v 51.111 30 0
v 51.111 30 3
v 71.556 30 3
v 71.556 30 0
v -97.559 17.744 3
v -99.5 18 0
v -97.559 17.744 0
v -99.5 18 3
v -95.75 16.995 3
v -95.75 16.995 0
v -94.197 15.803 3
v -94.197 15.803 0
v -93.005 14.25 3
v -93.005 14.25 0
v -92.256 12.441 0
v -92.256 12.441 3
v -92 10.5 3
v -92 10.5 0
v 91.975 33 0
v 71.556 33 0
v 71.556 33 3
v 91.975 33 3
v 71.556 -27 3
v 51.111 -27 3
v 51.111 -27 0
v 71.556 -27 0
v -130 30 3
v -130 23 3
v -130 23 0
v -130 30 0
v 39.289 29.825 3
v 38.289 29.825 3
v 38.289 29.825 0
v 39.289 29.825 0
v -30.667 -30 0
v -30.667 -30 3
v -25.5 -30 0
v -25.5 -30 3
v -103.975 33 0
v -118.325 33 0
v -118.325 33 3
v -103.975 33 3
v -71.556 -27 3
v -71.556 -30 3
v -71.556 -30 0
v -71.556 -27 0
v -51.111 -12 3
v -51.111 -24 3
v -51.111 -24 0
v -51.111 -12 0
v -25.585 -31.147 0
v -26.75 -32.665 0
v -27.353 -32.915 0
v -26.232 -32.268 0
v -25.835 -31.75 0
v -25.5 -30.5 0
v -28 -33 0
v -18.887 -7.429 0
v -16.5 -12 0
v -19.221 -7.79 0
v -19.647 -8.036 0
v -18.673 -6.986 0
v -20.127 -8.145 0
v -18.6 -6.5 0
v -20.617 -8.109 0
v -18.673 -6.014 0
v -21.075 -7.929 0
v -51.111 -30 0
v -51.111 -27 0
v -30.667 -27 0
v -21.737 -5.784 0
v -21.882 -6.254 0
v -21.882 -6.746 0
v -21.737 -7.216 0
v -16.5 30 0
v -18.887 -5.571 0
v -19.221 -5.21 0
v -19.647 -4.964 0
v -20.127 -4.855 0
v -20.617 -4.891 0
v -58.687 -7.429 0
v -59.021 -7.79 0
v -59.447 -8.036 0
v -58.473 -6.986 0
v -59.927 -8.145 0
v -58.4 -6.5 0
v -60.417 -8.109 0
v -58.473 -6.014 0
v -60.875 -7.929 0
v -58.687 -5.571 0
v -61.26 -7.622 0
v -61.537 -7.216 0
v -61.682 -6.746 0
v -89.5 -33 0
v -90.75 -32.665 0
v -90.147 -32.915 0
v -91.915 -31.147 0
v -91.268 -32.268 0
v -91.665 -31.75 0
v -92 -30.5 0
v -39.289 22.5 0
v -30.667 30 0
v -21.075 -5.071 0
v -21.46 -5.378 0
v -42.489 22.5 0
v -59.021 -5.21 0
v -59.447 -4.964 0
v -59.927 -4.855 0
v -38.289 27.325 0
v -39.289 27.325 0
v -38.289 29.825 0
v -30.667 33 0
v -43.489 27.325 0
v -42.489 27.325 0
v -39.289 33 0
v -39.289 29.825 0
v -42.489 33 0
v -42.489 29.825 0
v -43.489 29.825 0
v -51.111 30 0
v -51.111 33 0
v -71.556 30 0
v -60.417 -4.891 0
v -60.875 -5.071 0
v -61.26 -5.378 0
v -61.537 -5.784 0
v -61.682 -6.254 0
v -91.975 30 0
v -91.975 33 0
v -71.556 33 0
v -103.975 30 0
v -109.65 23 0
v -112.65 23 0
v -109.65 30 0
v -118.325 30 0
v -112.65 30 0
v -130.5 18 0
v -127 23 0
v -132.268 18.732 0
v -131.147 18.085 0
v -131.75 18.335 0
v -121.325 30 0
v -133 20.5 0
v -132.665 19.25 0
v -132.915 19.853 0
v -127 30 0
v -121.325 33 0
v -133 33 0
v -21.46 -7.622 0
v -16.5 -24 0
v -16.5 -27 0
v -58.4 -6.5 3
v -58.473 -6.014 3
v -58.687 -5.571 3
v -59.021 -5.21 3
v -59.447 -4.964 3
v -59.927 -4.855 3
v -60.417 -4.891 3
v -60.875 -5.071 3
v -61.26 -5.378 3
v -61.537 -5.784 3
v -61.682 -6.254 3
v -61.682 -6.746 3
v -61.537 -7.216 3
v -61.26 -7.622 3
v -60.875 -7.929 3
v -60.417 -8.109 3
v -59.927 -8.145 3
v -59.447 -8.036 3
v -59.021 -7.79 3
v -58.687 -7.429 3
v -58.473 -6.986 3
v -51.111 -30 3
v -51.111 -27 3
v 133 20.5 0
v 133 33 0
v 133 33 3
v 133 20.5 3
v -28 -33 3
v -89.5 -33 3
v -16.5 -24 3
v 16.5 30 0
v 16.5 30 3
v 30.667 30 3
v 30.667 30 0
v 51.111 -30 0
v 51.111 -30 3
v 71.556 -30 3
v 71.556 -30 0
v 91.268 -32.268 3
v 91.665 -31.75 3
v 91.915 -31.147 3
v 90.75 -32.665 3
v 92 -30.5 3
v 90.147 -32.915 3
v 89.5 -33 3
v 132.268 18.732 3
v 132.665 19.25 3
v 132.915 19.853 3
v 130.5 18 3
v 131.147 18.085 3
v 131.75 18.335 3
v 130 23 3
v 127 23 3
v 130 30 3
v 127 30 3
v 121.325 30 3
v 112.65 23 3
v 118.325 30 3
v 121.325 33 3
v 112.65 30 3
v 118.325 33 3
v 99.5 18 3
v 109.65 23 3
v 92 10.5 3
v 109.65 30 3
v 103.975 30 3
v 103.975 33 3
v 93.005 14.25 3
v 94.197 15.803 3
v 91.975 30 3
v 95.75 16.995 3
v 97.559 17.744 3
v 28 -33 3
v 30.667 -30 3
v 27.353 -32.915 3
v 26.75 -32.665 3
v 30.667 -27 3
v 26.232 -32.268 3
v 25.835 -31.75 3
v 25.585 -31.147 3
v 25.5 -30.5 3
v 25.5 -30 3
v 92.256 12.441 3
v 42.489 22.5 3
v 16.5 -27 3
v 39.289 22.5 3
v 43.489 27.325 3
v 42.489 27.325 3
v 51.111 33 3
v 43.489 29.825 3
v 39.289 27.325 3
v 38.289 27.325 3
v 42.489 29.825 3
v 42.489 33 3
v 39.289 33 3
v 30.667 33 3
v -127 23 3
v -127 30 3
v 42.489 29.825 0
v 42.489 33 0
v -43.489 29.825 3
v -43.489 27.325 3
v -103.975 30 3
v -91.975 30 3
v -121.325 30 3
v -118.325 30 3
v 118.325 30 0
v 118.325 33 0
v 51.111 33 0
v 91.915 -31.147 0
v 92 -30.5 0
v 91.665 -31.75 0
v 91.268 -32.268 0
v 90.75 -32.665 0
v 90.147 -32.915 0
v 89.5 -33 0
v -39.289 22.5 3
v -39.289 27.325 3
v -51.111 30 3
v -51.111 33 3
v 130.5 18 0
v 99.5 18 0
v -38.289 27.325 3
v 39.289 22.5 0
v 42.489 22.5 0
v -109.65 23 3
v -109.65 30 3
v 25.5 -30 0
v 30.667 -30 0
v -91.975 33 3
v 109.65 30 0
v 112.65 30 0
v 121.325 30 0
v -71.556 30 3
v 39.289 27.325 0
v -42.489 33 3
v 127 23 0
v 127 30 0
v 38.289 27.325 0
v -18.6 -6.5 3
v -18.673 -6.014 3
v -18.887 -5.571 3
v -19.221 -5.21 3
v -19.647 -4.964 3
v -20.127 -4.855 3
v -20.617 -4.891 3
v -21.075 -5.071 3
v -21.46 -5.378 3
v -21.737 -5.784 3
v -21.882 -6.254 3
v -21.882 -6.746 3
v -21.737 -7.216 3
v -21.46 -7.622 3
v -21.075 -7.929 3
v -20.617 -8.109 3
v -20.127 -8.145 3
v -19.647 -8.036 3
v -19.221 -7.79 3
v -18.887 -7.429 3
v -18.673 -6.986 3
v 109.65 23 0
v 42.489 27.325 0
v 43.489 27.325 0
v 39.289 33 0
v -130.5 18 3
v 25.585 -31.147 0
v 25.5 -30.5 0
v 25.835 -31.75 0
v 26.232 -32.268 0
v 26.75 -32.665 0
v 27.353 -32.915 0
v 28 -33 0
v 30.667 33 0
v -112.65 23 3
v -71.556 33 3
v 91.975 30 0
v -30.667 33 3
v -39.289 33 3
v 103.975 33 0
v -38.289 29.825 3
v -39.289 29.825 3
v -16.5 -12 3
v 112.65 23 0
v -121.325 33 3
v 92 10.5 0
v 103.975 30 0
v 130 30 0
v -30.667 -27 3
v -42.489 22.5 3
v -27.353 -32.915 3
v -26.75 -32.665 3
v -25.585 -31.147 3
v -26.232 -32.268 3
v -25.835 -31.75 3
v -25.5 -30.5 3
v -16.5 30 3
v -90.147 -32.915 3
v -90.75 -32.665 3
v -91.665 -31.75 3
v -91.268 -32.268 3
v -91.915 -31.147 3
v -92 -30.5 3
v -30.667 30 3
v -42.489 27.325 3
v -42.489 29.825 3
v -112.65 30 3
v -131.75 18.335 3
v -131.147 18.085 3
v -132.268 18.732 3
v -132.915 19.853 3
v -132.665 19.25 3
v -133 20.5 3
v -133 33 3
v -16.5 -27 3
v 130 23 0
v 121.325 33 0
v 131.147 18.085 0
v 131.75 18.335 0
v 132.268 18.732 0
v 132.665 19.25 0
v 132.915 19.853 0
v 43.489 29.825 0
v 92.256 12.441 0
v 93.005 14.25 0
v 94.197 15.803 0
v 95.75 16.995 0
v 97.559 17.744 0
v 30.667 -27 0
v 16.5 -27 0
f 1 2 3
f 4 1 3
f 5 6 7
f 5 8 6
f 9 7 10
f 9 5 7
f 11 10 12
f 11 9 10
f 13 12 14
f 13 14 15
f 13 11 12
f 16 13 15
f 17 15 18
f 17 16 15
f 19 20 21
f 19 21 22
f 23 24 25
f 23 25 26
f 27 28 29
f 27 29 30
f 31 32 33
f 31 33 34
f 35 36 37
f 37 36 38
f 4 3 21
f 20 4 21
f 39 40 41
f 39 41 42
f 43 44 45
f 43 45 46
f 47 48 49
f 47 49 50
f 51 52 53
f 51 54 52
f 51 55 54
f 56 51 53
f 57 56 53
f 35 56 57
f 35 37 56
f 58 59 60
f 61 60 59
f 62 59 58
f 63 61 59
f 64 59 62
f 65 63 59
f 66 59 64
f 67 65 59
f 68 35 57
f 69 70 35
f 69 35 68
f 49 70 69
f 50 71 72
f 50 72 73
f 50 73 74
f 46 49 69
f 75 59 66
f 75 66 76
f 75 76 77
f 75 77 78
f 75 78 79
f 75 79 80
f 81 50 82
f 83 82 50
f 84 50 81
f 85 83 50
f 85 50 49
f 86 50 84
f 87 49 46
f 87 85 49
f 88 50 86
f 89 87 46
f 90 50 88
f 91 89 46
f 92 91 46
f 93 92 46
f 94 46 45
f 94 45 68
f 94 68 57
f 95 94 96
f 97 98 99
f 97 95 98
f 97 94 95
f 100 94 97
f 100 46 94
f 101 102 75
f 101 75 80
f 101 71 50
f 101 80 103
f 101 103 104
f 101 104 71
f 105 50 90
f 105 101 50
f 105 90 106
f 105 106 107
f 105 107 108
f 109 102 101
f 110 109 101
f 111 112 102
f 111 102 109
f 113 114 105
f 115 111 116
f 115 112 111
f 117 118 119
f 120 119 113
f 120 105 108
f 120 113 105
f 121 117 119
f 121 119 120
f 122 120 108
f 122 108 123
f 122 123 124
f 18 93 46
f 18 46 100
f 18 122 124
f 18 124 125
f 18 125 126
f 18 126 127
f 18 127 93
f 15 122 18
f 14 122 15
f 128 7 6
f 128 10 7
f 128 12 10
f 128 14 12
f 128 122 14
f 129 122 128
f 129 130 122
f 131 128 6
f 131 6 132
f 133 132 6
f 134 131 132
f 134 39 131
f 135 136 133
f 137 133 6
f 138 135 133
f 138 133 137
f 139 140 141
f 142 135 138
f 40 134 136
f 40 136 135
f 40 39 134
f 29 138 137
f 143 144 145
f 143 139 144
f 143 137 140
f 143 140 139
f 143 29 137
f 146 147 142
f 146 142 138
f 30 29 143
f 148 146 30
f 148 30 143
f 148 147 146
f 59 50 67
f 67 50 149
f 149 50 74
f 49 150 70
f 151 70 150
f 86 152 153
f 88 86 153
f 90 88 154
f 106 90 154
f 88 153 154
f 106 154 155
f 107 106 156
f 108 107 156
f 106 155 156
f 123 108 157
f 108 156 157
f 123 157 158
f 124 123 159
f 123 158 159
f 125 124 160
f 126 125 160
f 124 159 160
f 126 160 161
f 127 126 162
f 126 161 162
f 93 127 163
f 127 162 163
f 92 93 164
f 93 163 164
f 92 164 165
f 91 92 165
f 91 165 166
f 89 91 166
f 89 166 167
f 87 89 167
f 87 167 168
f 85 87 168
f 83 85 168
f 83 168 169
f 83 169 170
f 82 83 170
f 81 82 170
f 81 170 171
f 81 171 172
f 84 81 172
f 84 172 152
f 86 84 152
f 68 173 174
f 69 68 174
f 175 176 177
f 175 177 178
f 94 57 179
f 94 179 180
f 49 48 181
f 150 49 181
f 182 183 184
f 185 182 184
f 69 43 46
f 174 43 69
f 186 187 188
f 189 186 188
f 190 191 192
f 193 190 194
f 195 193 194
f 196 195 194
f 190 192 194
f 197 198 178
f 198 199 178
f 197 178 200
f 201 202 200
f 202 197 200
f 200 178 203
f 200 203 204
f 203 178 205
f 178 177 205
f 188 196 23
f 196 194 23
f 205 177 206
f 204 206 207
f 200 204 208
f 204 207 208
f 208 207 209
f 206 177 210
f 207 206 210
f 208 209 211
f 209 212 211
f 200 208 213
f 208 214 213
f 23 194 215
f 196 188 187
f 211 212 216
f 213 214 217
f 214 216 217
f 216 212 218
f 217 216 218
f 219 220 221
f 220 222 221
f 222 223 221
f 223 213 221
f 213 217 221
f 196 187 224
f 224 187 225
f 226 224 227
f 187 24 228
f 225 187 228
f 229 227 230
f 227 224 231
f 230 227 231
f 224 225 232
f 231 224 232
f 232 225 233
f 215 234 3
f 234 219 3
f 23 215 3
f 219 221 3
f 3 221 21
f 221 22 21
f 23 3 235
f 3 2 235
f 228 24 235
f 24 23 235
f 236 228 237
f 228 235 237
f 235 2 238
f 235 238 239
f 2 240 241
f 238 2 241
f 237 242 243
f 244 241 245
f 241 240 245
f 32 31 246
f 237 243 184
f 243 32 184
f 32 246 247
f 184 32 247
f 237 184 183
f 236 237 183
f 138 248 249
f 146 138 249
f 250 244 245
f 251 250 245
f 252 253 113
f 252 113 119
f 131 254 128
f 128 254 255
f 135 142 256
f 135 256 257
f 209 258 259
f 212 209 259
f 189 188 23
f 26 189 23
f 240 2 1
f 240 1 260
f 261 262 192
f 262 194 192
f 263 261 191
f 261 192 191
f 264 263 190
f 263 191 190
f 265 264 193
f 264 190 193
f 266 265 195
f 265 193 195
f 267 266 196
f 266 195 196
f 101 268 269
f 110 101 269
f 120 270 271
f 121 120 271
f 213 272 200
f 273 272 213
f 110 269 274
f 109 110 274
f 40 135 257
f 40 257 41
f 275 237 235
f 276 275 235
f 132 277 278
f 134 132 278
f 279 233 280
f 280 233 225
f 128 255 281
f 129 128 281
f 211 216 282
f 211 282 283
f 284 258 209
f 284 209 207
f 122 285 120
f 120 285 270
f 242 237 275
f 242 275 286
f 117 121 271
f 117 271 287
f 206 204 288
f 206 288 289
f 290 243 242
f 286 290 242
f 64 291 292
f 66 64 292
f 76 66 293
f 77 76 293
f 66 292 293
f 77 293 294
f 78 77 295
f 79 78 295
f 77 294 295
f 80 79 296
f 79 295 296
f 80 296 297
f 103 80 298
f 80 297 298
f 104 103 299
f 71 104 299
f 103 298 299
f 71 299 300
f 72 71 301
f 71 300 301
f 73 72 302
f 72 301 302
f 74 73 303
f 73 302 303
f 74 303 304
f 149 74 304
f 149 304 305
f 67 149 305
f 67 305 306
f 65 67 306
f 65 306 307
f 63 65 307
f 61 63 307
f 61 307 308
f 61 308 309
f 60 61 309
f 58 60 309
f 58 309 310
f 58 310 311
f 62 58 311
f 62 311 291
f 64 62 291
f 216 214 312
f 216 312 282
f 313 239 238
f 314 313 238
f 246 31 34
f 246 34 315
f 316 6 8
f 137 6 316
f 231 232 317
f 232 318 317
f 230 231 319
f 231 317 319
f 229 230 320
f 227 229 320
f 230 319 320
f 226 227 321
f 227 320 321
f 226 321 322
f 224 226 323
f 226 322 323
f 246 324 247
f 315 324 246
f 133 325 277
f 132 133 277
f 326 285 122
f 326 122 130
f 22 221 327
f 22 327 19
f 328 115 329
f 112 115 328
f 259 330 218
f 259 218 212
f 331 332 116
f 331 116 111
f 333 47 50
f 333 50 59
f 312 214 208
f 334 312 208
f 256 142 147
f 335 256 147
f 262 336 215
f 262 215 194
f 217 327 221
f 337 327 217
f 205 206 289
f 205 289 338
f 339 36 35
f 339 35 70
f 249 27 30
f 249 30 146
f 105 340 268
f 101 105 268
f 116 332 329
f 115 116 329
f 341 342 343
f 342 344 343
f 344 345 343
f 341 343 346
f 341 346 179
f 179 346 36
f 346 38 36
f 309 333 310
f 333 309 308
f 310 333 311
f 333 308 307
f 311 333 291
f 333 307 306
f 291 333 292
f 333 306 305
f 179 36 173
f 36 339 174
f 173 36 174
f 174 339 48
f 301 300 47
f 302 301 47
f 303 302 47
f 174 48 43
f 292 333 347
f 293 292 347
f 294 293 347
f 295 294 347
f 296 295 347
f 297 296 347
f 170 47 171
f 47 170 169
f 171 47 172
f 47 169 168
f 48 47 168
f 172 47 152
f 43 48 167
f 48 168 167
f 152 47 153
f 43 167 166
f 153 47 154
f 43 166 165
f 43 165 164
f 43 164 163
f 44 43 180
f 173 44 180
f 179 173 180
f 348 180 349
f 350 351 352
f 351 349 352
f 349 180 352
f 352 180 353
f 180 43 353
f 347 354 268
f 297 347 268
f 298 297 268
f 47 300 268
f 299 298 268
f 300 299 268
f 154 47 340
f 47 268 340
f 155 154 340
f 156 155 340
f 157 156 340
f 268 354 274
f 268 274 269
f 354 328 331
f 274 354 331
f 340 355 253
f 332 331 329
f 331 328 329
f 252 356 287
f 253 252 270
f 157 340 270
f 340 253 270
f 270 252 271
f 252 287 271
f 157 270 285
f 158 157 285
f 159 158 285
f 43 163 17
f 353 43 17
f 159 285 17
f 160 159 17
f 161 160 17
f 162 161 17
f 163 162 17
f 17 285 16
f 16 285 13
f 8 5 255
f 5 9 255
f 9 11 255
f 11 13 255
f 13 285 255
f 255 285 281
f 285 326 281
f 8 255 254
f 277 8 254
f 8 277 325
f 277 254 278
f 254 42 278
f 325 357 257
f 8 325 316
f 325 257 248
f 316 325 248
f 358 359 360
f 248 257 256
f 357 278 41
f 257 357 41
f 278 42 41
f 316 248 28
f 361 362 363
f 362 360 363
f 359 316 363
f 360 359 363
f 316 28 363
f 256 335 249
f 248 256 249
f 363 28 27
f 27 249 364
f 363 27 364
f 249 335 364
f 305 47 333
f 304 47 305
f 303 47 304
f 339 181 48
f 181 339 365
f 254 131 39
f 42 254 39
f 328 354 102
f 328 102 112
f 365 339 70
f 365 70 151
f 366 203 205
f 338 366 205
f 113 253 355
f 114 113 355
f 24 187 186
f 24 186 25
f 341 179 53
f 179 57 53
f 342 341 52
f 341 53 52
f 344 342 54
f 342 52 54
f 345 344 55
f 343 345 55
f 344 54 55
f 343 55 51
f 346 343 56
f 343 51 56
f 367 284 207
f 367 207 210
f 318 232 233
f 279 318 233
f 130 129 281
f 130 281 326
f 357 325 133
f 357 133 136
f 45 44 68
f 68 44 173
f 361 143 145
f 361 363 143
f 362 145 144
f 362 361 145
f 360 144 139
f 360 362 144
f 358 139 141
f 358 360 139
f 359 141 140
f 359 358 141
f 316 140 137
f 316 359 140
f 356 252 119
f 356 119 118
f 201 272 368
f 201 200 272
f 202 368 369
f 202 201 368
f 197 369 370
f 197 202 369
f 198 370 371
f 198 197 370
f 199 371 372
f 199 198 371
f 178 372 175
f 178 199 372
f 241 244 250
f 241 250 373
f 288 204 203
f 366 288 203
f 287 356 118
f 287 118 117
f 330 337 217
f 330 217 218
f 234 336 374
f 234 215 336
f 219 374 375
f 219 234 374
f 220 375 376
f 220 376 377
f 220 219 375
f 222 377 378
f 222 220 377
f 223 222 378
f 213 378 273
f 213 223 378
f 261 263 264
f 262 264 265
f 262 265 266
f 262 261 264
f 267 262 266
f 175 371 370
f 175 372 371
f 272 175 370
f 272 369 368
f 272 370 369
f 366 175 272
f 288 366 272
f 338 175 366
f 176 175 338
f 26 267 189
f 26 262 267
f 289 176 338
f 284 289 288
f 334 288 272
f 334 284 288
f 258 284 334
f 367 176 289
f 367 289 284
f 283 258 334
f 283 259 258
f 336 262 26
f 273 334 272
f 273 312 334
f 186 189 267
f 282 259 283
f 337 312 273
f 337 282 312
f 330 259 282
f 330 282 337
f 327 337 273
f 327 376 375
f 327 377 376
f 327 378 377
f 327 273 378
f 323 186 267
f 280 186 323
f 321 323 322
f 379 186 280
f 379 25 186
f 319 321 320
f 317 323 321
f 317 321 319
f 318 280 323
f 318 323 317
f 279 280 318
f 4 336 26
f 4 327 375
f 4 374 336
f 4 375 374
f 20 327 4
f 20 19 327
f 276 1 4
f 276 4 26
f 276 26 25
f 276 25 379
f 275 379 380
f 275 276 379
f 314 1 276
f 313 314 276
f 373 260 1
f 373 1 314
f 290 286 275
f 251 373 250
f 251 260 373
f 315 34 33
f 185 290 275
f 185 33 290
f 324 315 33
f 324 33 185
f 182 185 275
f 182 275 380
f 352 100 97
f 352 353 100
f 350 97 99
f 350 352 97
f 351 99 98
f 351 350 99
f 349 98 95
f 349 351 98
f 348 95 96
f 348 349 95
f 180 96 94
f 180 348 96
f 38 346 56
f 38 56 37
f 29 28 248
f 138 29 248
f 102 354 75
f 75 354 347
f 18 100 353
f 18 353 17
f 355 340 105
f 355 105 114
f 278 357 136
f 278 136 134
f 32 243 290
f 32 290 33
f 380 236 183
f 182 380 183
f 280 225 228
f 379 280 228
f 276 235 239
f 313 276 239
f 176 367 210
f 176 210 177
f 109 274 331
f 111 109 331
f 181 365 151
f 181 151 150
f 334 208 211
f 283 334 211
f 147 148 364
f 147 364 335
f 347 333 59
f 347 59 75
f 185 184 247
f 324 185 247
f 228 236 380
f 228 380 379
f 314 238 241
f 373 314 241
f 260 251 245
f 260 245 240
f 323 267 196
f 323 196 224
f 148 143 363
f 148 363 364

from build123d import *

# Parameters (mm, degrees)
BOSS_EXTRUDE1_DEPTH     = 3
SKETCH3_W               = 3
SKETCH3_H               = 7
SKETCH3_W_2             = 20.444444445
SKETCH3_H_2             = 3
CUT_EXTRUDE1_DEPTH      = 1
CUT_EXTRUDE1_DEPTH_BACK = 4
FILLET1_R               = 7.5
SKETCH4_W               = 3.2
SKETCH4_H               = 10.5
SKETCH4_W_2             = 5.2
SKETCH4_H_2             = 2.5
CUT_EXTRUDE2_DEPTH      = 1
CUT_EXTRUDE2_DEPTH_BACK = 4
SKETCH5_W               = 33
SKETCH5_H               = 66
CUT_EXTRUDE3_DEPTH      = 1
CUT_EXTRUDE3_DEPTH_BACK = 4
SKETCH6_R               = 1.65
SKETCH6_W               = 34.611111111
SKETCH6_H               = 12
CUT_EXTRUDE4_DEPTH      = 1
CUT_EXTRUDE4_DEPTH_BACK = 4
SKETCH9_W               = 9
SKETCH9_H               = 3
CUT_EXTRUDE7_DEPTH      = 1
CUT_EXTRUDE7_DEPTH_BACK = 4
FILLET2_R               = 2.5
FILLET3_R               = 2.5
SKETCH7_W               = 3
SKETCH7_H               = 3
SKETCH7_W_2             = 10
CUT_EXTRUDE5_DEPTH      = 4
CUT_EXTRUDE5_DEPTH_BACK = 1
SKETCH8_W               = 2
SKETCH8_H               = 3
CUT_EXTRUDE6_DEPTH      = 1
CUT_EXTRUDE6_DEPTH_BACK = 4


with BuildPart() as part:
    # Sketch2 → Boss-Extrude1 (new body)
    with BuildSketch(Plane.XY):
        Polygon((-133, 33), (133, 33), (133, 18), (92, 18), (92, -33), (-92, -33), (-92, 18), (-133, 18), align=None)
    extrude(amount=BOSS_EXTRUDE1_DEPTH)

    # Sketch3 → Cut-Extrude1 (cut, two sides)
    with BuildSketch(Plane.XY.offset(3)) as cut_extrude1_sk:
        with Locations((-128.5, 26.5)):
            Rectangle(SKETCH3_W, SKETCH3_H)
        with Locations((-111.15, 26.5)):
            Rectangle(SKETCH3_W, SKETCH3_H)
        with Locations((-61.333333334, 31.5)):
            Rectangle(SKETCH3_W_2, SKETCH3_H_2)
        with Locations((-20.444444445, 31.5)):
            Rectangle(SKETCH3_W_2, SKETCH3_H_2)
        with Locations((20.444444445, 31.5)):
            Rectangle(SKETCH3_W_2, SKETCH3_H_2)
        with Locations((61.333333334, 31.5)):
            Rectangle(SKETCH3_W_2, SKETCH3_H_2)
        with Locations((128.5, 26.5)):
            Rectangle(SKETCH3_W, SKETCH3_H)
        with Locations((111.15, 26.5)):
            Rectangle(SKETCH3_W, SKETCH3_H)
        with Locations((-61.333333334, -28.5)):
            Rectangle(SKETCH3_W_2, SKETCH3_H_2)
        with Locations((-20.444444445, -28.5)):
            Rectangle(SKETCH3_W_2, SKETCH3_H_2)
        with Locations((20.444444445, -28.5)):
            Rectangle(SKETCH3_W_2, SKETCH3_H_2)
        with Locations((61.333333334, -28.5)):
            Rectangle(SKETCH3_W_2, SKETCH3_H_2)
    extrude(amount=CUT_EXTRUDE1_DEPTH, mode=Mode.SUBTRACT)
    extrude(cut_extrude1_sk.sketch, amount=-CUT_EXTRUDE1_DEPTH_BACK, mode=Mode.SUBTRACT)

    # Fillet1
    fillet1_edges = [part.edges().sort_by_distance(p)[0] for p in [
        (92, 18, 1.5),
        (-92, 18, 1.5),
    ]]
    fillet(fillet1_edges, radius=FILLET1_R)

    # Sketch4 → Cut-Extrude2 (cut, two sides)
    with BuildSketch(Plane.XY.offset(3)) as cut_extrude2_sk:
        with Locations((-40.888888889, 27.75)):
            Rectangle(SKETCH4_W, SKETCH4_H)
        with Locations((40.888888889, 27.75)):
            Rectangle(SKETCH4_W, SKETCH4_H)
        with Locations((40.888888889, 28.575)):
            Rectangle(SKETCH4_W_2, SKETCH4_H_2)
        with Locations((-40.888888889, 28.575)):
            Rectangle(SKETCH4_W_2, SKETCH4_H_2)
    extrude(amount=CUT_EXTRUDE2_DEPTH, mode=Mode.SUBTRACT)
    extrude(cut_extrude2_sk.sketch, amount=-CUT_EXTRUDE2_DEPTH_BACK, mode=Mode.SUBTRACT)

    # Sketch5 → Cut-Extrude3 (cut, two sides)
    with BuildSketch(Plane.XY.offset(3)) as cut_extrude3_sk:
        Rectangle(SKETCH5_W, SKETCH5_H)
    extrude(amount=CUT_EXTRUDE3_DEPTH, mode=Mode.SUBTRACT)
    extrude(cut_extrude3_sk.sketch, amount=-CUT_EXTRUDE3_DEPTH_BACK, mode=Mode.SUBTRACT)

    # Sketch6 → Cut-Extrude4 (cut, two sides)
    with BuildSketch(Plane.XY.offset(3)) as cut_extrude4_sk:
        with Locations((-20.25, -6.5)):
            Circle(SKETCH6_R)
        with Locations((-60.05, -6.5)):
            Circle(SKETCH6_R)
        with Locations((-33.805555556, -18)):
            Rectangle(SKETCH6_W, SKETCH6_H)
    extrude(amount=CUT_EXTRUDE4_DEPTH, mode=Mode.SUBTRACT)
    extrude(cut_extrude4_sk.sketch, amount=-CUT_EXTRUDE4_DEPTH_BACK, mode=Mode.SUBTRACT)

    # Sketch9 → Cut-Extrude7 (cut, two sides)
    with BuildSketch(Plane.XY.offset(3)) as cut_extrude7_sk:
        with Locations((-21, -31.5)):
            Rectangle(SKETCH9_W, SKETCH9_H)
        with Locations((21, -31.5)):
            Rectangle(SKETCH9_W, SKETCH9_H)
    extrude(amount=CUT_EXTRUDE7_DEPTH, mode=Mode.SUBTRACT)
    extrude(cut_extrude7_sk.sketch, amount=-CUT_EXTRUDE7_DEPTH_BACK, mode=Mode.SUBTRACT)

    # Fillet2
    fillet2_edges = [part.edges().sort_by_distance(p)[0] for p in [
        (92, -33, 1.5),
        (133, 18, 1.5),
        (25.5, -33, 1.5),
    ]]
    fillet(fillet2_edges, radius=FILLET2_R)

    # Fillet3
    fillet3_edges = [part.edges().sort_by_distance(p)[0] for p in [
        (-92, -33, 1.5),
        (-133, 18, 1.5),
        (-25.5, -33, 1.5),
    ]]
    fillet(fillet3_edges, radius=FILLET3_R)

    # Sketch7 → Cut-Extrude5 (cut, two sides)
    with BuildSketch(Plane.XY) as cut_extrude5_sk:
        with Locations((-119.825, 31.5)):
            Rectangle(SKETCH7_W, SKETCH7_H)
        with Locations((119.825, 31.5)):
            Rectangle(SKETCH7_W, SKETCH7_H)
        with Locations((-98.975, 31.5)):
            Rectangle(SKETCH7_W_2, SKETCH7_H)
        with Locations((98.975, 31.5)):
            Rectangle(SKETCH7_W_2, SKETCH7_H)
    extrude(amount=CUT_EXTRUDE5_DEPTH, mode=Mode.SUBTRACT)
    extrude(cut_extrude5_sk.sketch, amount=-CUT_EXTRUDE5_DEPTH_BACK, mode=Mode.SUBTRACT)

    # Sketch8 → Cut-Extrude6 (cut, two sides)
    with BuildSketch(Plane.XY.offset(3)) as cut_extrude6_sk:
        with Locations((-92.975, 31.5)):
            Rectangle(SKETCH8_W, SKETCH8_H)
        with Locations((92.975, 31.5)):
            Rectangle(SKETCH8_W, SKETCH8_H)
    extrude(amount=CUT_EXTRUDE6_DEPTH, mode=Mode.SUBTRACT)
    extrude(cut_extrude6_sk.sketch, amount=-CUT_EXTRUDE6_DEPTH_BACK, mode=Mode.SUBTRACT)


solid = part.part
